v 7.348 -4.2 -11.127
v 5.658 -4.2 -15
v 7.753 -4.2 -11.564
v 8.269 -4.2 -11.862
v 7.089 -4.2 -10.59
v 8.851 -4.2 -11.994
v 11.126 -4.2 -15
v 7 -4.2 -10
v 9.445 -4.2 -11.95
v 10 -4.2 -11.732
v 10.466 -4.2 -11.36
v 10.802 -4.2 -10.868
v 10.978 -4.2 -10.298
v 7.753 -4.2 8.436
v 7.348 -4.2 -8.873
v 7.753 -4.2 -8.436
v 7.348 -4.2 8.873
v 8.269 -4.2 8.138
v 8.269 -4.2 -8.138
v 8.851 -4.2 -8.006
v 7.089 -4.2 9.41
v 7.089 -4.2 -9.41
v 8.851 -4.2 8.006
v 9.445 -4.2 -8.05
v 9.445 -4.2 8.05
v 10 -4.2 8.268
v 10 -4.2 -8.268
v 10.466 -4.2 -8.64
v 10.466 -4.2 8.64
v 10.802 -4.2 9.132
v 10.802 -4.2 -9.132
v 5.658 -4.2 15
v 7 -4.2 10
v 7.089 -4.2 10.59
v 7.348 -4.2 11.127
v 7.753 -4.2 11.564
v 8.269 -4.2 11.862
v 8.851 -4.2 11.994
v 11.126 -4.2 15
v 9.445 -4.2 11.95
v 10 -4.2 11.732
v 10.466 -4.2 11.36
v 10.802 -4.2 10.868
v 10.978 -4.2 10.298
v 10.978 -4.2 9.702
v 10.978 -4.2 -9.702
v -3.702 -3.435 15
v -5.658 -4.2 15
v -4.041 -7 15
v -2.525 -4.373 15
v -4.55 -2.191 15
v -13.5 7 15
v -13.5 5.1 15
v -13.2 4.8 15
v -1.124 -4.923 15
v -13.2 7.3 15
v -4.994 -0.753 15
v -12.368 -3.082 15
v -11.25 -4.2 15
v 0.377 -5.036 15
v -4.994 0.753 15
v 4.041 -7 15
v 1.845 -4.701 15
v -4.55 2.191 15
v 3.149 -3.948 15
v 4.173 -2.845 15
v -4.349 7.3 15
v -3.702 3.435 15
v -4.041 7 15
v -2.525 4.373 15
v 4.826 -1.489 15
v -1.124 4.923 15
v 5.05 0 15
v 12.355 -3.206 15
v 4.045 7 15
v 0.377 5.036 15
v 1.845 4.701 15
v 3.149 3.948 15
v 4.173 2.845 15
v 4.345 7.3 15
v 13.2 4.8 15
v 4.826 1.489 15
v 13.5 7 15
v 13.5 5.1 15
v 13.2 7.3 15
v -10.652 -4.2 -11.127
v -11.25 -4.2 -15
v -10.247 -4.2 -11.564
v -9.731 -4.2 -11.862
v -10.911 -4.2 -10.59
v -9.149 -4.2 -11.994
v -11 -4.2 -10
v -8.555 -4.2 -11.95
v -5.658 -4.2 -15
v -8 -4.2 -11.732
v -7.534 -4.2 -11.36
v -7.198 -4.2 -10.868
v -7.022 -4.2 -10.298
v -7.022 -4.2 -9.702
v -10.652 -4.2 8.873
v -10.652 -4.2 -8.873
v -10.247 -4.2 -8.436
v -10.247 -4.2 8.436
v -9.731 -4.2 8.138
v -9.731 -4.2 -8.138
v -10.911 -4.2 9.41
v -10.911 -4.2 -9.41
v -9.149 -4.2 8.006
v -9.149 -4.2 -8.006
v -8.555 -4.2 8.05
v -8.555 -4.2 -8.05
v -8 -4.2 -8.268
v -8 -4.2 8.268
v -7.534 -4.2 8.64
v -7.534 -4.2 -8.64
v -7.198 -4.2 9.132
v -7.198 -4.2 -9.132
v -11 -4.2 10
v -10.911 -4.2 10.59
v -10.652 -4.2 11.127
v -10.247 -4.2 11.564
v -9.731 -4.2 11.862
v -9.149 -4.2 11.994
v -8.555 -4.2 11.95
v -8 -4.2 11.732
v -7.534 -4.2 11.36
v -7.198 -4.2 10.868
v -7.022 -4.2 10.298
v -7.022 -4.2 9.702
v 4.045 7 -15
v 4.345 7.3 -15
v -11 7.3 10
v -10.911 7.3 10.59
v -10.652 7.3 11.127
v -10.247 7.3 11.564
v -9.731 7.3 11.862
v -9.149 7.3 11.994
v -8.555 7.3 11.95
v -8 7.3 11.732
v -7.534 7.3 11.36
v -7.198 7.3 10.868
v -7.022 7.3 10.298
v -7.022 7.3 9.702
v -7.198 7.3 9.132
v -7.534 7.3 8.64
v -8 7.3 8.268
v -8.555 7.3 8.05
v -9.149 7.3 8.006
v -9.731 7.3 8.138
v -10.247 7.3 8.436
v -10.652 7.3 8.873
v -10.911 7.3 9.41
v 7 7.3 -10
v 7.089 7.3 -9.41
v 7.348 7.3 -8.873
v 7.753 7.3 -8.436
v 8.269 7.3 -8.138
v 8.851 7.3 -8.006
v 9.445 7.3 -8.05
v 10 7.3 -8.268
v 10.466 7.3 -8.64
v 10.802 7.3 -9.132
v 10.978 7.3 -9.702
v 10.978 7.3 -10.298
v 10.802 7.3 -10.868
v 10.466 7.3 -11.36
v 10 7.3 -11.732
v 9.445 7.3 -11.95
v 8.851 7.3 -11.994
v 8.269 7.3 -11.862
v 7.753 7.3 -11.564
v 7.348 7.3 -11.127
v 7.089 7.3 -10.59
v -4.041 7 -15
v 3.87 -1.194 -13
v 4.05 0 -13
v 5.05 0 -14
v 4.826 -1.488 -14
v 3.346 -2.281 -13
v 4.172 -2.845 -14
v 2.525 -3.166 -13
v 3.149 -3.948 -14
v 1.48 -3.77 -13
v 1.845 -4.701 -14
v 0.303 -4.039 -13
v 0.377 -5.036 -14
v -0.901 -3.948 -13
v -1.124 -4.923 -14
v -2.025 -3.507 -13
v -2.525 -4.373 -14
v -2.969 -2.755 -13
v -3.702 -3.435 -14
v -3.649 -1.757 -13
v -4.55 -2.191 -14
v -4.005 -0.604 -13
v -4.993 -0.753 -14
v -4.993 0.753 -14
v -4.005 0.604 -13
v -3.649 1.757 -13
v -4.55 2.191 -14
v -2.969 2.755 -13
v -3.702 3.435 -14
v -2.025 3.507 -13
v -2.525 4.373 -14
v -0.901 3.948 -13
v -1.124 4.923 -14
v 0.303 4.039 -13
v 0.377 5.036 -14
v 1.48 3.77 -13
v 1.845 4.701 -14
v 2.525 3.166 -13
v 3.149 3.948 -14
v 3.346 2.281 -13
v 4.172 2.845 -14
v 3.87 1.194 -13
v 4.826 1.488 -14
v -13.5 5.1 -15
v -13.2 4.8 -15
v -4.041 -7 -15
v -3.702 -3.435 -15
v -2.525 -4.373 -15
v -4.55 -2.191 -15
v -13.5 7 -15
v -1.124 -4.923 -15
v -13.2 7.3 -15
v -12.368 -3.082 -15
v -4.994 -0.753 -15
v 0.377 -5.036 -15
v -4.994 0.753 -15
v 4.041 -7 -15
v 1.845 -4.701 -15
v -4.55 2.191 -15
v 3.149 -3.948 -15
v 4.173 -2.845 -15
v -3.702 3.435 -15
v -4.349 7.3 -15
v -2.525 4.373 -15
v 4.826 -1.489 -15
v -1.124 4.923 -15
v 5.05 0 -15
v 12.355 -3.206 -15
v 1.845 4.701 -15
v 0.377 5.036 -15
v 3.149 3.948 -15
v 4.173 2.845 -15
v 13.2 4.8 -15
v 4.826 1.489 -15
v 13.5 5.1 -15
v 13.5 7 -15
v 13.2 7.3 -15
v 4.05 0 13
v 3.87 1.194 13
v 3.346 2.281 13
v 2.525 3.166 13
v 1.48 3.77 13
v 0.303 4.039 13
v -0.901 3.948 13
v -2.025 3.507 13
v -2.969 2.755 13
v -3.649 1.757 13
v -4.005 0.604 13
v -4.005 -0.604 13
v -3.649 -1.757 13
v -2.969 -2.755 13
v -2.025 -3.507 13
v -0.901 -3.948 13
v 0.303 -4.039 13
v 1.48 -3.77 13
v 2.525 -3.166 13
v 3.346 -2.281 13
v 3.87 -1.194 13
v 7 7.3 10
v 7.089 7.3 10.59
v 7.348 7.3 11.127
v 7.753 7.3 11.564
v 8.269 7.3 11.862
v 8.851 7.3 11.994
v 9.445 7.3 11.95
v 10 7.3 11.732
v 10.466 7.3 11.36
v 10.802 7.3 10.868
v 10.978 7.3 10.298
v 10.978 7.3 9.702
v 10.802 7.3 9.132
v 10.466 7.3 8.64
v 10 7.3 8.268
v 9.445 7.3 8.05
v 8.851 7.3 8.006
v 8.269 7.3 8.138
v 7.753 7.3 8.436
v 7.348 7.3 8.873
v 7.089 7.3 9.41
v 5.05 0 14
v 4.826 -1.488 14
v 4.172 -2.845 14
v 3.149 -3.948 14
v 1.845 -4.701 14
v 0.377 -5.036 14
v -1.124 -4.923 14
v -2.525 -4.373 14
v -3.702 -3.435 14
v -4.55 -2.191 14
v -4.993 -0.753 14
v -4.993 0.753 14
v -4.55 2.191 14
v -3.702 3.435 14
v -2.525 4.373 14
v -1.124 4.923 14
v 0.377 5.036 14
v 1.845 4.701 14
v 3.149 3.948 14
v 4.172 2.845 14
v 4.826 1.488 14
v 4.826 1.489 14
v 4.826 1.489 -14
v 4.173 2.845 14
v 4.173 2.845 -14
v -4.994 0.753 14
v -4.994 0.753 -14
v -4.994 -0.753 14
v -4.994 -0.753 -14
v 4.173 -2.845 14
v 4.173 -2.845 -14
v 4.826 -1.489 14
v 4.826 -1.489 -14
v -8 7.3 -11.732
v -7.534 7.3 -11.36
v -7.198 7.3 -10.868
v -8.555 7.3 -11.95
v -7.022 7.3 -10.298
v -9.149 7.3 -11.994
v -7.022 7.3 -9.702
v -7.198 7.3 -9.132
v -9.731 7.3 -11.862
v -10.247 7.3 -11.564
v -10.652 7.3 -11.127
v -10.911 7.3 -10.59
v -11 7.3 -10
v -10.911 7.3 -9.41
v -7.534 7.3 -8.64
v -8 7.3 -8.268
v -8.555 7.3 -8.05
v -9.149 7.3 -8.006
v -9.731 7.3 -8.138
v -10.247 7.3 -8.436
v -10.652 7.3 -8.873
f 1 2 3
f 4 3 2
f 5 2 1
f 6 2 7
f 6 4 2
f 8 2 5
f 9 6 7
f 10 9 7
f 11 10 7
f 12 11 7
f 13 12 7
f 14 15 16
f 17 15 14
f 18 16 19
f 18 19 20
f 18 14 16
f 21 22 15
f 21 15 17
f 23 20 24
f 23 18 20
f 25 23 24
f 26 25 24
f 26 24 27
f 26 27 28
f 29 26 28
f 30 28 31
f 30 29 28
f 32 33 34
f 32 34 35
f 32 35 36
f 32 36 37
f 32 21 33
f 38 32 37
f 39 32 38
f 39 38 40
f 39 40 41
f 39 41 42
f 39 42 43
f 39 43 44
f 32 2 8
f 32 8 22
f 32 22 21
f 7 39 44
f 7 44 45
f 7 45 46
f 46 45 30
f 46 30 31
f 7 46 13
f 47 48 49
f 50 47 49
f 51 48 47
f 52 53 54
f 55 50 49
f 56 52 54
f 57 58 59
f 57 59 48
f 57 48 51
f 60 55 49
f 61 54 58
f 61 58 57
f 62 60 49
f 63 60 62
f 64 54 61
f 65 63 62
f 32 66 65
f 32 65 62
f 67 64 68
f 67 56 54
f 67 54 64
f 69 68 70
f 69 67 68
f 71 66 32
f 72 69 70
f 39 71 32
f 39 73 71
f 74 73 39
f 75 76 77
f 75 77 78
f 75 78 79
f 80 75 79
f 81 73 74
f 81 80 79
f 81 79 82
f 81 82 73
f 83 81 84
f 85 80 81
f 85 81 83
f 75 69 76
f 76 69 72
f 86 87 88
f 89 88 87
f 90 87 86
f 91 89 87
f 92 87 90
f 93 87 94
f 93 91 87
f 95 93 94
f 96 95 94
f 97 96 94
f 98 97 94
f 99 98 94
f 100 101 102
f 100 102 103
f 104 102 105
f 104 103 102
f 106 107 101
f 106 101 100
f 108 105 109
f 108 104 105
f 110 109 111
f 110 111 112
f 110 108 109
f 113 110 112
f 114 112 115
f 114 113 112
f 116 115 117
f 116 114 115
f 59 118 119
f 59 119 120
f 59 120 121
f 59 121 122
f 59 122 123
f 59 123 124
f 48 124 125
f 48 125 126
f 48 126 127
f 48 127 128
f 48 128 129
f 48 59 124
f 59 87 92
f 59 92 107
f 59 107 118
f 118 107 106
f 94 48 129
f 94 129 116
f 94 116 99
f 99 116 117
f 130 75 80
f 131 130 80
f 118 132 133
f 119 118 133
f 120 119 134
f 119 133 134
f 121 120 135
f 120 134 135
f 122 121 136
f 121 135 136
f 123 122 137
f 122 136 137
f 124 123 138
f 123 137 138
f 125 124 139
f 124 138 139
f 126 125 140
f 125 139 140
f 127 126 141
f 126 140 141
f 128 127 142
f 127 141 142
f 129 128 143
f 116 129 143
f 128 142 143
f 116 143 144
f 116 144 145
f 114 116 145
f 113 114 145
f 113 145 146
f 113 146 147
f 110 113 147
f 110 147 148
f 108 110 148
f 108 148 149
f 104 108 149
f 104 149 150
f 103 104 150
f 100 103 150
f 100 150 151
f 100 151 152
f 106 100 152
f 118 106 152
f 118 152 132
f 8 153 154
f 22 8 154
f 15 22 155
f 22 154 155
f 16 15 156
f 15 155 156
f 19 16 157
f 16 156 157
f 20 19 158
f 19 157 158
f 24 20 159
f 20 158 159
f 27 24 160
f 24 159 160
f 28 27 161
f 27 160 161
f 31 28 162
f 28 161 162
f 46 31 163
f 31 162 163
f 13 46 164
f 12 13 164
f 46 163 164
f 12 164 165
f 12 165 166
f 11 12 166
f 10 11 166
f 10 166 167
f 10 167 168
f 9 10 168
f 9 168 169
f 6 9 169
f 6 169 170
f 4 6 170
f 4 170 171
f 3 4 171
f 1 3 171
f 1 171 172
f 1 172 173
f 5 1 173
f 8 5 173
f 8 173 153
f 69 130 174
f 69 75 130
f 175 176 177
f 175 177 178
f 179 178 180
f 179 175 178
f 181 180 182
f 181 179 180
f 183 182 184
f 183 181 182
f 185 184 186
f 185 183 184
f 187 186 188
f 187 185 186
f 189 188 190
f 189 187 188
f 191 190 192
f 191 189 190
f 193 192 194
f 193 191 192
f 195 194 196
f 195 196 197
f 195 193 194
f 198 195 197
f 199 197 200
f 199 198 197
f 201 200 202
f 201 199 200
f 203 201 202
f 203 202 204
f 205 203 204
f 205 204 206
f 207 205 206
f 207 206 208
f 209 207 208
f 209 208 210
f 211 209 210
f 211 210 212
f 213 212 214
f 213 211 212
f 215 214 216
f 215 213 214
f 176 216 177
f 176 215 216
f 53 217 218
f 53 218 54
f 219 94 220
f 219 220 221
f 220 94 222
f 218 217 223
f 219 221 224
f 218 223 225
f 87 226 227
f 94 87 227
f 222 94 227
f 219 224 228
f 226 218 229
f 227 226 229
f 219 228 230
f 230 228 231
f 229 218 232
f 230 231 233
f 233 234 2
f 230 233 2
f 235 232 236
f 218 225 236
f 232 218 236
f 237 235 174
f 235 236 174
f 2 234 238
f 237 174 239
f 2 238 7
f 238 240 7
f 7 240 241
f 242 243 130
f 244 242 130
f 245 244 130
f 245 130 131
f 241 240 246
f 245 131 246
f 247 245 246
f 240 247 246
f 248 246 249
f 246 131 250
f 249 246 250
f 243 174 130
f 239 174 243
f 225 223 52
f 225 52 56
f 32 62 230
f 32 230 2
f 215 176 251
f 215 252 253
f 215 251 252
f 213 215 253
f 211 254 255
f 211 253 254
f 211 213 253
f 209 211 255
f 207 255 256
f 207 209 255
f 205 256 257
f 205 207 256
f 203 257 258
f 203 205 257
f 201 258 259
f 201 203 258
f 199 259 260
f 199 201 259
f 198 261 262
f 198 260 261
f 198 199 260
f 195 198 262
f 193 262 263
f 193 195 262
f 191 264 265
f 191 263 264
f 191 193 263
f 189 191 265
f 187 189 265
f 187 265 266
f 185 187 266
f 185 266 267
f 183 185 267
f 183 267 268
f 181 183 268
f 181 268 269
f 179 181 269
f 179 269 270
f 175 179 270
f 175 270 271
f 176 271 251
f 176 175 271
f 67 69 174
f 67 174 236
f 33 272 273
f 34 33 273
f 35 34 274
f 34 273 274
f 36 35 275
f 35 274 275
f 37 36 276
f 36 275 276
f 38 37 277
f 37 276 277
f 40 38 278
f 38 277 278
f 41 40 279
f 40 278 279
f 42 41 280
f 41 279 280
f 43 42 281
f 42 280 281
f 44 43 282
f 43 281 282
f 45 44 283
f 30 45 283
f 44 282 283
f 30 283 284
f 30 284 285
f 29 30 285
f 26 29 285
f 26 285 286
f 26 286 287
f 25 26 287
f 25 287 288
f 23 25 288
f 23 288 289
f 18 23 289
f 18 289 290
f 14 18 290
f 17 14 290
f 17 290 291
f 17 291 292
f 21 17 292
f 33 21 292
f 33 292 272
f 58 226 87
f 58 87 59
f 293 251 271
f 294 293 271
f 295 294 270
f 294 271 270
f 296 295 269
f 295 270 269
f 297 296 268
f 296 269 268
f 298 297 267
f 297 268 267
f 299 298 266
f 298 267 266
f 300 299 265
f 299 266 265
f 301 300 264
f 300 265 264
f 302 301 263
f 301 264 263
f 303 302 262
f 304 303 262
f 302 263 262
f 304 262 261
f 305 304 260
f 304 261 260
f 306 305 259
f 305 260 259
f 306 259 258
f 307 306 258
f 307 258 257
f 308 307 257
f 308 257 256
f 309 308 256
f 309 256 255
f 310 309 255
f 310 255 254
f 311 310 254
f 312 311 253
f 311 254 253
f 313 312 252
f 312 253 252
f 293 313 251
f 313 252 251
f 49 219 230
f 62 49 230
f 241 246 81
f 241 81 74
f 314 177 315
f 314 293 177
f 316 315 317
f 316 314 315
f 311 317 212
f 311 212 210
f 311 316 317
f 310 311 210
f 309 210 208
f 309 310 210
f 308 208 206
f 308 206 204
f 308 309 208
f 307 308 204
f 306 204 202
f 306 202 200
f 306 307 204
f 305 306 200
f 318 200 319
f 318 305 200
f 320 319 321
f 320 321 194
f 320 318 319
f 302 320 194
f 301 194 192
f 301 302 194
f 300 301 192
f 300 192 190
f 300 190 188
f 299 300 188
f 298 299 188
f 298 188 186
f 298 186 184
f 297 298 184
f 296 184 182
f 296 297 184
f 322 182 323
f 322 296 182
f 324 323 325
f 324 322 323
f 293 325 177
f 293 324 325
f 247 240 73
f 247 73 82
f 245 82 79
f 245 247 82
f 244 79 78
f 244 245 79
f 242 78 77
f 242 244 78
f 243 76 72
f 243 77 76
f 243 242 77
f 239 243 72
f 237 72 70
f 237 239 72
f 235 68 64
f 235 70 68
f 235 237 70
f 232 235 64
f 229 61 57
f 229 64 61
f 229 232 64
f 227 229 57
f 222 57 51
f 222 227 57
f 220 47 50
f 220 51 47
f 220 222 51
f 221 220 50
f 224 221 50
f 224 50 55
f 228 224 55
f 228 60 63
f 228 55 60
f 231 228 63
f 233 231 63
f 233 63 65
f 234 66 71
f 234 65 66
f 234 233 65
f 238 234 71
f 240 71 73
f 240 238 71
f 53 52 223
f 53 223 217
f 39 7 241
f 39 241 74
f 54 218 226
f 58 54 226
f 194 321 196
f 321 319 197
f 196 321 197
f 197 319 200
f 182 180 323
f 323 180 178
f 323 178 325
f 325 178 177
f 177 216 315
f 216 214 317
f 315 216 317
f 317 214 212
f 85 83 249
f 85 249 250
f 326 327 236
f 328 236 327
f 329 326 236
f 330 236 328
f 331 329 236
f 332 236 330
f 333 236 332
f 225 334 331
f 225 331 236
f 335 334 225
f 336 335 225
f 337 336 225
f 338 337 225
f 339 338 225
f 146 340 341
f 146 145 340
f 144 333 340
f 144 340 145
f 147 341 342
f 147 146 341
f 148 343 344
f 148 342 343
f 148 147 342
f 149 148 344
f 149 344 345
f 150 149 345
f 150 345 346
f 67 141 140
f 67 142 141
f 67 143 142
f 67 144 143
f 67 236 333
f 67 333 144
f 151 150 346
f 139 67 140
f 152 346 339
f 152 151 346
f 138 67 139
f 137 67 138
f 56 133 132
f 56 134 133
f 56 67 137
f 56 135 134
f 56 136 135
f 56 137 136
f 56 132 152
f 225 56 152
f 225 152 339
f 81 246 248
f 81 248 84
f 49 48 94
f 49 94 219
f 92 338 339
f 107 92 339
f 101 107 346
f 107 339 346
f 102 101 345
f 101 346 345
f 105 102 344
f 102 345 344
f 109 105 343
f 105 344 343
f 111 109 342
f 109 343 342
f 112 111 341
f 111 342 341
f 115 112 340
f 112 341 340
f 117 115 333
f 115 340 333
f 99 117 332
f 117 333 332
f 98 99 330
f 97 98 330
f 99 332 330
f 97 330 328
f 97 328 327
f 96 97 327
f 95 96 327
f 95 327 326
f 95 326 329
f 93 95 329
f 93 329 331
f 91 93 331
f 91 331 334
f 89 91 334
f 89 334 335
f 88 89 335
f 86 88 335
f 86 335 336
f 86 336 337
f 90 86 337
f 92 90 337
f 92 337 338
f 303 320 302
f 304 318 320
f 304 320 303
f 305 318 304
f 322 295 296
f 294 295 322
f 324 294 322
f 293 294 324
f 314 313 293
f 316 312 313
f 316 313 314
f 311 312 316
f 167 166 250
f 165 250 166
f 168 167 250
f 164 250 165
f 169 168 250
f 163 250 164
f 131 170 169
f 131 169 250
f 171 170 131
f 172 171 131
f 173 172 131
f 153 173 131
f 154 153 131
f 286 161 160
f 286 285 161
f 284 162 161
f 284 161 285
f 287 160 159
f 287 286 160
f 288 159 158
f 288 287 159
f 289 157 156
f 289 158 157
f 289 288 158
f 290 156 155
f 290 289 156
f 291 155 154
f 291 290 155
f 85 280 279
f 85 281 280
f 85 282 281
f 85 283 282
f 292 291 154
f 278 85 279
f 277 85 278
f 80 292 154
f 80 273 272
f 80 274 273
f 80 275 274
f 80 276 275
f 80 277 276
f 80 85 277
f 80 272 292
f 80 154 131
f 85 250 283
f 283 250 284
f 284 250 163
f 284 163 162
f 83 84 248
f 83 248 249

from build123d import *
from OCP.BRepFilletAPI import BRepFilletAPI_MakeChamfer

# Parameters (mm, degrees)
BOSS_EXTRUDE1_DEPTH     = 15
BOSS_EXTRUDE2_DEPTH     = 15
CHAMFER1_SIZE           = 0.3
CHAMFER1_SIZE_2         = 0.303787717
CUT_EXTRUDE1_DEPTH      = 22.460195712
CUT_EXTRUDE1_DEPTH_BACK = 22.460195712
CHAMFER2_SIZE           = 0.3
CHAMFER3_SIZE           = 1
CHAMFER3_SIZE2          = 1.124223602
CUT_EXTRUDE2_DEPTH      = 22.460195712
CUT_EXTRUDE2_DEPTH_BACK = 22.460195712
SKETCH3_R               = 5.05
SKETCH6_R               = 5.05
BOSS_EXTRUDE3_DEPTH     = 14
CUT_EXTRUDE3_DEPTH      = 22.460195712
CUT_EXTRUDE3_DEPTH_BACK = 22.460195712
SKETCH7_R               = 4.05
CHAMFER4_SIZE           = 1
SKETCH8_R               = 2
CUT_EXTRUDE4_DEPTH      = 25.733378257


# Some blends are built 0.0001 mm under size
with BuildPart() as part:
    # Sketch2 → Boss-Extrude1 (new, symmetric)
    with BuildSketch(Plane.XY):
        Polygon((4.041451884, -7), (8.082903769, 0), (4.041451884, 7), (-4.041451884, 7), (-8.082903769, 0), (-4.041451884, -7), align=None)
    extrude(amount=BOSS_EXTRUDE1_DEPTH, both=True)

    # Sketch4 → Boss-Extrude2 (add, symmetric)
    with BuildSketch(Plane.XY):
        Polygon((5.658032638, -4.2), (13.5, -4.2), (13.5, 7.3), (4.045169627, 7.3), (4.041451884, 7), (-4.041451884, 7), (-4.045169627, 7.3), (-13.5, 7.3), (-13.5, -4.2), (-5.658032638, -4.2), (-4.041451884, -7), (4.041451884, -7), align=None)
    extrude(amount=BOSS_EXTRUDE2_DEPTH, both=True)

    # Chamfer1
    # the kernel refuses this chamfer: 0.303787717, 0.3 mm, written as the material it adds along each edge
    # the kernel refuses this chamfer: 0.303787717, 0.3 mm, written as the material it takes off along each edge
    with BuildSketch(Plane(origin=(13.5, 7.3, -15.771504896), x_dir=(0.027495876610584384, -0.9996219169112968, 0), z_dir=(0, 0, 1))) as chamfer1_2_piece_1:
        Polygon((CHAMFER1_SIZE * 0.999621916911, -CHAMFER1_SIZE * 0.0274958766106), (-CHAMFER1_SIZE * 0.0274958766106, -CHAMFER1_SIZE * 0.999621916911), (0, 0), align=None)
    extrude(amount=31.543009793, mode=Mode.SUBTRACT)
    with BuildSketch(Plane(origin=(-13.5, 7.3, -15.771504896), x_dir=(-0.027495876610584464, -0.9996219169112968, 0), z_dir=(0, 0, 1))) as chamfer1_2_piece_2:
        Polygon((CHAMFER1_SIZE * 0.999621916911, CHAMFER1_SIZE * 0.0274958766106), (-CHAMFER1_SIZE * 0.0274958766106, CHAMFER1_SIZE * 0.999621916911), (0, 0), align=None)
    extrude(amount=31.543009793, mode=Mode.SUBTRACT)
    with BuildSketch(Plane(origin=(4.045169627, 7.3, -15.78150282), x_dir=(-0.039528988982007254, -0.9992184240845743, 0), z_dir=(0, 0, 1))) as chamfer1_2_piece_3_section:
        Polygon((CHAMFER1_SIZE_2 * 0.999631529085, CHAMFER1_SIZE_2 * 0.0271441162549), (-CHAMFER1_SIZE * 0.039528988982, CHAMFER1_SIZE * 0.999218424085), (0, 0), align=None)
    chamfer1_2_piece_3 = extrude(amount=31.56300564, mode=Mode.PRIVATE)
    chamfer1_2_piece_3 = split(chamfer1_2_piece_3, bisect_by=Plane(origin=(4.143930379, 7, 0), z_dir=(0, 1, 0)), keep=Keep.TOP, mode=Mode.PRIVATE)
    add(chamfer1_2_piece_3, mode=Mode.SUBTRACT)
    with BuildSketch(Plane(origin=(-4.045169627, 7.3, -15.78150282), x_dir=(0.04021769089274653, -0.9991909413817038, 0), z_dir=(0, 0, 1))) as chamfer1_2_piece_4:
        Polygon((CHAMFER1_SIZE * 0.999612584063, -CHAMFER1_SIZE * 0.027833105882), (-CHAMFER1_SIZE_2 * 0.0402176908322, -CHAMFER1_SIZE_2 * 0.999190939877), (0, 0), align=None)
    extrude(amount=31.56300564, mode=Mode.SUBTRACT)

    # Sketch5 → Cut-Extrude1 (cut, two sides: drawn at the far end of the back side and taken through both)
    with BuildSketch(Plane.XY.offset(-CUT_EXTRUDE1_DEPTH_BACK)):
        Polygon((12.25, -4.2), (13.5, -4.2), (13.5, 4.8), (13.2, 4.8), align=None)
        Polygon((-13.2, 4.8), (-12.25, -4.2), (-13.5, -4.2), (-13.5, 4.8), align=None)
    extrude(amount=CUT_EXTRUDE1_DEPTH + CUT_EXTRUDE1_DEPTH_BACK, mode=Mode.SUBTRACT)

    # Chamfer2
    chamfer2_edges = [part.edges().sort_by_distance(p)[0] for p in [
        (-13.5, 4.8, 0),
        (13.5, 4.8, 0),
    ]]
    chamfer(chamfer2_edges, length=CHAMFER2_SIZE - 0.0001)  # a hair under: the kernel refuses the full size

    # Chamfer3: one chamfer whose edges measure the first distance from different faces: ONE call of the kernel's chamfer builder (chamfer() names one face for all edges)
    chamfer3_edges_1 = [part.edges().sort_by_distance(p)[0] for p in [
        (-12.25, -4.2, 0),
    ]]
    chamfer3_side_1 = [part.faces().sort_by_distance(p)[0] for p in [
        (-8.954016319, -4.2, 0),
    ]]
    chamfer3_edges_2 = [part.edges().sort_by_distance(p)[0] for p in [
        (12.25, -4.2, 0),
    ]]
    chamfer3_side_2 = [part.faces().sort_by_distance(p)[0] for p in [
        (12.725, 0.3, 0),
    ]]
    chamfer3 = BRepFilletAPI_MakeChamfer(part.part.solid().wrapped)
    for e in chamfer3_edges_1:
        chamfer3.Add(CHAMFER3_SIZE, CHAMFER3_SIZE2, e.wrapped, chamfer3_side_1[0].wrapped)  # the first distance lies on this face
    for e in chamfer3_edges_2:
        chamfer3.Add(CHAMFER3_SIZE, CHAMFER3_SIZE2, e.wrapped, chamfer3_side_2[0].wrapped)  # the first distance lies on this face
    add(Compound.cast(chamfer3.Shape()), mode=Mode.REPLACE)

    # Sketch3 → Cut-Extrude2 (cut, two sides: drawn at the far end of the back side and taken through both)
    with BuildSketch(Plane.XY.offset(-CUT_EXTRUDE2_DEPTH_BACK)):
        Circle(SKETCH3_R)
    extrude(amount=CUT_EXTRUDE2_DEPTH + CUT_EXTRUDE2_DEPTH_BACK, mode=Mode.SUBTRACT)

    # Sketch8 → Cut-Extrude4 (cut, through all)
    with BuildSketch(Plane(origin=(0, 7.3, 0), x_dir=(1, 0, 0), z_dir=(0, 1, 0))):
        with Locations(Location((-9, 10, 0), (0, 0, 180))):
            Circle(SKETCH8_R)
        with Locations(Location((9, 10, 0), (0, 0, 180))):
            Circle(SKETCH8_R)
        with Locations(Location((9, -10, 0), (0, 0, 180))):
            Circle(SKETCH8_R)
        with Locations(Location((-9, -10, 0), (0, 0, 180))):
            Circle(SKETCH8_R)
    extrude(amount=-CUT_EXTRUDE4_DEPTH, mode=Mode.SUBTRACT)


with BuildPart() as body_2:
    # Sketch6 → Boss-Extrude3 (new, symmetric)
    with BuildSketch(Plane.XY):
        Circle(SKETCH6_R)
    extrude(amount=BOSS_EXTRUDE3_DEPTH, both=True)

    # Sketch7 → Cut-Extrude3 (cut, two sides: drawn at the far end of the back side and taken through both)
    with BuildSketch(Plane.XY.offset(-CUT_EXTRUDE3_DEPTH_BACK)):
        Circle(SKETCH7_R)
    extrude(amount=CUT_EXTRUDE3_DEPTH + CUT_EXTRUDE3_DEPTH_BACK, mode=Mode.SUBTRACT)

    # Chamfer4
    chamfer4_edges = [body_2.edges().sort_by_distance(p)[0] for p in [
        (-4.05, 0, 14),
        (-4.05, 0, -14),
    ]]
    chamfer(chamfer4_edges, length=CHAMFER4_SIZE - 0.0001)  # a hair under: the kernel refuses the full size


solid = Compound([part.part, body_2.part])
